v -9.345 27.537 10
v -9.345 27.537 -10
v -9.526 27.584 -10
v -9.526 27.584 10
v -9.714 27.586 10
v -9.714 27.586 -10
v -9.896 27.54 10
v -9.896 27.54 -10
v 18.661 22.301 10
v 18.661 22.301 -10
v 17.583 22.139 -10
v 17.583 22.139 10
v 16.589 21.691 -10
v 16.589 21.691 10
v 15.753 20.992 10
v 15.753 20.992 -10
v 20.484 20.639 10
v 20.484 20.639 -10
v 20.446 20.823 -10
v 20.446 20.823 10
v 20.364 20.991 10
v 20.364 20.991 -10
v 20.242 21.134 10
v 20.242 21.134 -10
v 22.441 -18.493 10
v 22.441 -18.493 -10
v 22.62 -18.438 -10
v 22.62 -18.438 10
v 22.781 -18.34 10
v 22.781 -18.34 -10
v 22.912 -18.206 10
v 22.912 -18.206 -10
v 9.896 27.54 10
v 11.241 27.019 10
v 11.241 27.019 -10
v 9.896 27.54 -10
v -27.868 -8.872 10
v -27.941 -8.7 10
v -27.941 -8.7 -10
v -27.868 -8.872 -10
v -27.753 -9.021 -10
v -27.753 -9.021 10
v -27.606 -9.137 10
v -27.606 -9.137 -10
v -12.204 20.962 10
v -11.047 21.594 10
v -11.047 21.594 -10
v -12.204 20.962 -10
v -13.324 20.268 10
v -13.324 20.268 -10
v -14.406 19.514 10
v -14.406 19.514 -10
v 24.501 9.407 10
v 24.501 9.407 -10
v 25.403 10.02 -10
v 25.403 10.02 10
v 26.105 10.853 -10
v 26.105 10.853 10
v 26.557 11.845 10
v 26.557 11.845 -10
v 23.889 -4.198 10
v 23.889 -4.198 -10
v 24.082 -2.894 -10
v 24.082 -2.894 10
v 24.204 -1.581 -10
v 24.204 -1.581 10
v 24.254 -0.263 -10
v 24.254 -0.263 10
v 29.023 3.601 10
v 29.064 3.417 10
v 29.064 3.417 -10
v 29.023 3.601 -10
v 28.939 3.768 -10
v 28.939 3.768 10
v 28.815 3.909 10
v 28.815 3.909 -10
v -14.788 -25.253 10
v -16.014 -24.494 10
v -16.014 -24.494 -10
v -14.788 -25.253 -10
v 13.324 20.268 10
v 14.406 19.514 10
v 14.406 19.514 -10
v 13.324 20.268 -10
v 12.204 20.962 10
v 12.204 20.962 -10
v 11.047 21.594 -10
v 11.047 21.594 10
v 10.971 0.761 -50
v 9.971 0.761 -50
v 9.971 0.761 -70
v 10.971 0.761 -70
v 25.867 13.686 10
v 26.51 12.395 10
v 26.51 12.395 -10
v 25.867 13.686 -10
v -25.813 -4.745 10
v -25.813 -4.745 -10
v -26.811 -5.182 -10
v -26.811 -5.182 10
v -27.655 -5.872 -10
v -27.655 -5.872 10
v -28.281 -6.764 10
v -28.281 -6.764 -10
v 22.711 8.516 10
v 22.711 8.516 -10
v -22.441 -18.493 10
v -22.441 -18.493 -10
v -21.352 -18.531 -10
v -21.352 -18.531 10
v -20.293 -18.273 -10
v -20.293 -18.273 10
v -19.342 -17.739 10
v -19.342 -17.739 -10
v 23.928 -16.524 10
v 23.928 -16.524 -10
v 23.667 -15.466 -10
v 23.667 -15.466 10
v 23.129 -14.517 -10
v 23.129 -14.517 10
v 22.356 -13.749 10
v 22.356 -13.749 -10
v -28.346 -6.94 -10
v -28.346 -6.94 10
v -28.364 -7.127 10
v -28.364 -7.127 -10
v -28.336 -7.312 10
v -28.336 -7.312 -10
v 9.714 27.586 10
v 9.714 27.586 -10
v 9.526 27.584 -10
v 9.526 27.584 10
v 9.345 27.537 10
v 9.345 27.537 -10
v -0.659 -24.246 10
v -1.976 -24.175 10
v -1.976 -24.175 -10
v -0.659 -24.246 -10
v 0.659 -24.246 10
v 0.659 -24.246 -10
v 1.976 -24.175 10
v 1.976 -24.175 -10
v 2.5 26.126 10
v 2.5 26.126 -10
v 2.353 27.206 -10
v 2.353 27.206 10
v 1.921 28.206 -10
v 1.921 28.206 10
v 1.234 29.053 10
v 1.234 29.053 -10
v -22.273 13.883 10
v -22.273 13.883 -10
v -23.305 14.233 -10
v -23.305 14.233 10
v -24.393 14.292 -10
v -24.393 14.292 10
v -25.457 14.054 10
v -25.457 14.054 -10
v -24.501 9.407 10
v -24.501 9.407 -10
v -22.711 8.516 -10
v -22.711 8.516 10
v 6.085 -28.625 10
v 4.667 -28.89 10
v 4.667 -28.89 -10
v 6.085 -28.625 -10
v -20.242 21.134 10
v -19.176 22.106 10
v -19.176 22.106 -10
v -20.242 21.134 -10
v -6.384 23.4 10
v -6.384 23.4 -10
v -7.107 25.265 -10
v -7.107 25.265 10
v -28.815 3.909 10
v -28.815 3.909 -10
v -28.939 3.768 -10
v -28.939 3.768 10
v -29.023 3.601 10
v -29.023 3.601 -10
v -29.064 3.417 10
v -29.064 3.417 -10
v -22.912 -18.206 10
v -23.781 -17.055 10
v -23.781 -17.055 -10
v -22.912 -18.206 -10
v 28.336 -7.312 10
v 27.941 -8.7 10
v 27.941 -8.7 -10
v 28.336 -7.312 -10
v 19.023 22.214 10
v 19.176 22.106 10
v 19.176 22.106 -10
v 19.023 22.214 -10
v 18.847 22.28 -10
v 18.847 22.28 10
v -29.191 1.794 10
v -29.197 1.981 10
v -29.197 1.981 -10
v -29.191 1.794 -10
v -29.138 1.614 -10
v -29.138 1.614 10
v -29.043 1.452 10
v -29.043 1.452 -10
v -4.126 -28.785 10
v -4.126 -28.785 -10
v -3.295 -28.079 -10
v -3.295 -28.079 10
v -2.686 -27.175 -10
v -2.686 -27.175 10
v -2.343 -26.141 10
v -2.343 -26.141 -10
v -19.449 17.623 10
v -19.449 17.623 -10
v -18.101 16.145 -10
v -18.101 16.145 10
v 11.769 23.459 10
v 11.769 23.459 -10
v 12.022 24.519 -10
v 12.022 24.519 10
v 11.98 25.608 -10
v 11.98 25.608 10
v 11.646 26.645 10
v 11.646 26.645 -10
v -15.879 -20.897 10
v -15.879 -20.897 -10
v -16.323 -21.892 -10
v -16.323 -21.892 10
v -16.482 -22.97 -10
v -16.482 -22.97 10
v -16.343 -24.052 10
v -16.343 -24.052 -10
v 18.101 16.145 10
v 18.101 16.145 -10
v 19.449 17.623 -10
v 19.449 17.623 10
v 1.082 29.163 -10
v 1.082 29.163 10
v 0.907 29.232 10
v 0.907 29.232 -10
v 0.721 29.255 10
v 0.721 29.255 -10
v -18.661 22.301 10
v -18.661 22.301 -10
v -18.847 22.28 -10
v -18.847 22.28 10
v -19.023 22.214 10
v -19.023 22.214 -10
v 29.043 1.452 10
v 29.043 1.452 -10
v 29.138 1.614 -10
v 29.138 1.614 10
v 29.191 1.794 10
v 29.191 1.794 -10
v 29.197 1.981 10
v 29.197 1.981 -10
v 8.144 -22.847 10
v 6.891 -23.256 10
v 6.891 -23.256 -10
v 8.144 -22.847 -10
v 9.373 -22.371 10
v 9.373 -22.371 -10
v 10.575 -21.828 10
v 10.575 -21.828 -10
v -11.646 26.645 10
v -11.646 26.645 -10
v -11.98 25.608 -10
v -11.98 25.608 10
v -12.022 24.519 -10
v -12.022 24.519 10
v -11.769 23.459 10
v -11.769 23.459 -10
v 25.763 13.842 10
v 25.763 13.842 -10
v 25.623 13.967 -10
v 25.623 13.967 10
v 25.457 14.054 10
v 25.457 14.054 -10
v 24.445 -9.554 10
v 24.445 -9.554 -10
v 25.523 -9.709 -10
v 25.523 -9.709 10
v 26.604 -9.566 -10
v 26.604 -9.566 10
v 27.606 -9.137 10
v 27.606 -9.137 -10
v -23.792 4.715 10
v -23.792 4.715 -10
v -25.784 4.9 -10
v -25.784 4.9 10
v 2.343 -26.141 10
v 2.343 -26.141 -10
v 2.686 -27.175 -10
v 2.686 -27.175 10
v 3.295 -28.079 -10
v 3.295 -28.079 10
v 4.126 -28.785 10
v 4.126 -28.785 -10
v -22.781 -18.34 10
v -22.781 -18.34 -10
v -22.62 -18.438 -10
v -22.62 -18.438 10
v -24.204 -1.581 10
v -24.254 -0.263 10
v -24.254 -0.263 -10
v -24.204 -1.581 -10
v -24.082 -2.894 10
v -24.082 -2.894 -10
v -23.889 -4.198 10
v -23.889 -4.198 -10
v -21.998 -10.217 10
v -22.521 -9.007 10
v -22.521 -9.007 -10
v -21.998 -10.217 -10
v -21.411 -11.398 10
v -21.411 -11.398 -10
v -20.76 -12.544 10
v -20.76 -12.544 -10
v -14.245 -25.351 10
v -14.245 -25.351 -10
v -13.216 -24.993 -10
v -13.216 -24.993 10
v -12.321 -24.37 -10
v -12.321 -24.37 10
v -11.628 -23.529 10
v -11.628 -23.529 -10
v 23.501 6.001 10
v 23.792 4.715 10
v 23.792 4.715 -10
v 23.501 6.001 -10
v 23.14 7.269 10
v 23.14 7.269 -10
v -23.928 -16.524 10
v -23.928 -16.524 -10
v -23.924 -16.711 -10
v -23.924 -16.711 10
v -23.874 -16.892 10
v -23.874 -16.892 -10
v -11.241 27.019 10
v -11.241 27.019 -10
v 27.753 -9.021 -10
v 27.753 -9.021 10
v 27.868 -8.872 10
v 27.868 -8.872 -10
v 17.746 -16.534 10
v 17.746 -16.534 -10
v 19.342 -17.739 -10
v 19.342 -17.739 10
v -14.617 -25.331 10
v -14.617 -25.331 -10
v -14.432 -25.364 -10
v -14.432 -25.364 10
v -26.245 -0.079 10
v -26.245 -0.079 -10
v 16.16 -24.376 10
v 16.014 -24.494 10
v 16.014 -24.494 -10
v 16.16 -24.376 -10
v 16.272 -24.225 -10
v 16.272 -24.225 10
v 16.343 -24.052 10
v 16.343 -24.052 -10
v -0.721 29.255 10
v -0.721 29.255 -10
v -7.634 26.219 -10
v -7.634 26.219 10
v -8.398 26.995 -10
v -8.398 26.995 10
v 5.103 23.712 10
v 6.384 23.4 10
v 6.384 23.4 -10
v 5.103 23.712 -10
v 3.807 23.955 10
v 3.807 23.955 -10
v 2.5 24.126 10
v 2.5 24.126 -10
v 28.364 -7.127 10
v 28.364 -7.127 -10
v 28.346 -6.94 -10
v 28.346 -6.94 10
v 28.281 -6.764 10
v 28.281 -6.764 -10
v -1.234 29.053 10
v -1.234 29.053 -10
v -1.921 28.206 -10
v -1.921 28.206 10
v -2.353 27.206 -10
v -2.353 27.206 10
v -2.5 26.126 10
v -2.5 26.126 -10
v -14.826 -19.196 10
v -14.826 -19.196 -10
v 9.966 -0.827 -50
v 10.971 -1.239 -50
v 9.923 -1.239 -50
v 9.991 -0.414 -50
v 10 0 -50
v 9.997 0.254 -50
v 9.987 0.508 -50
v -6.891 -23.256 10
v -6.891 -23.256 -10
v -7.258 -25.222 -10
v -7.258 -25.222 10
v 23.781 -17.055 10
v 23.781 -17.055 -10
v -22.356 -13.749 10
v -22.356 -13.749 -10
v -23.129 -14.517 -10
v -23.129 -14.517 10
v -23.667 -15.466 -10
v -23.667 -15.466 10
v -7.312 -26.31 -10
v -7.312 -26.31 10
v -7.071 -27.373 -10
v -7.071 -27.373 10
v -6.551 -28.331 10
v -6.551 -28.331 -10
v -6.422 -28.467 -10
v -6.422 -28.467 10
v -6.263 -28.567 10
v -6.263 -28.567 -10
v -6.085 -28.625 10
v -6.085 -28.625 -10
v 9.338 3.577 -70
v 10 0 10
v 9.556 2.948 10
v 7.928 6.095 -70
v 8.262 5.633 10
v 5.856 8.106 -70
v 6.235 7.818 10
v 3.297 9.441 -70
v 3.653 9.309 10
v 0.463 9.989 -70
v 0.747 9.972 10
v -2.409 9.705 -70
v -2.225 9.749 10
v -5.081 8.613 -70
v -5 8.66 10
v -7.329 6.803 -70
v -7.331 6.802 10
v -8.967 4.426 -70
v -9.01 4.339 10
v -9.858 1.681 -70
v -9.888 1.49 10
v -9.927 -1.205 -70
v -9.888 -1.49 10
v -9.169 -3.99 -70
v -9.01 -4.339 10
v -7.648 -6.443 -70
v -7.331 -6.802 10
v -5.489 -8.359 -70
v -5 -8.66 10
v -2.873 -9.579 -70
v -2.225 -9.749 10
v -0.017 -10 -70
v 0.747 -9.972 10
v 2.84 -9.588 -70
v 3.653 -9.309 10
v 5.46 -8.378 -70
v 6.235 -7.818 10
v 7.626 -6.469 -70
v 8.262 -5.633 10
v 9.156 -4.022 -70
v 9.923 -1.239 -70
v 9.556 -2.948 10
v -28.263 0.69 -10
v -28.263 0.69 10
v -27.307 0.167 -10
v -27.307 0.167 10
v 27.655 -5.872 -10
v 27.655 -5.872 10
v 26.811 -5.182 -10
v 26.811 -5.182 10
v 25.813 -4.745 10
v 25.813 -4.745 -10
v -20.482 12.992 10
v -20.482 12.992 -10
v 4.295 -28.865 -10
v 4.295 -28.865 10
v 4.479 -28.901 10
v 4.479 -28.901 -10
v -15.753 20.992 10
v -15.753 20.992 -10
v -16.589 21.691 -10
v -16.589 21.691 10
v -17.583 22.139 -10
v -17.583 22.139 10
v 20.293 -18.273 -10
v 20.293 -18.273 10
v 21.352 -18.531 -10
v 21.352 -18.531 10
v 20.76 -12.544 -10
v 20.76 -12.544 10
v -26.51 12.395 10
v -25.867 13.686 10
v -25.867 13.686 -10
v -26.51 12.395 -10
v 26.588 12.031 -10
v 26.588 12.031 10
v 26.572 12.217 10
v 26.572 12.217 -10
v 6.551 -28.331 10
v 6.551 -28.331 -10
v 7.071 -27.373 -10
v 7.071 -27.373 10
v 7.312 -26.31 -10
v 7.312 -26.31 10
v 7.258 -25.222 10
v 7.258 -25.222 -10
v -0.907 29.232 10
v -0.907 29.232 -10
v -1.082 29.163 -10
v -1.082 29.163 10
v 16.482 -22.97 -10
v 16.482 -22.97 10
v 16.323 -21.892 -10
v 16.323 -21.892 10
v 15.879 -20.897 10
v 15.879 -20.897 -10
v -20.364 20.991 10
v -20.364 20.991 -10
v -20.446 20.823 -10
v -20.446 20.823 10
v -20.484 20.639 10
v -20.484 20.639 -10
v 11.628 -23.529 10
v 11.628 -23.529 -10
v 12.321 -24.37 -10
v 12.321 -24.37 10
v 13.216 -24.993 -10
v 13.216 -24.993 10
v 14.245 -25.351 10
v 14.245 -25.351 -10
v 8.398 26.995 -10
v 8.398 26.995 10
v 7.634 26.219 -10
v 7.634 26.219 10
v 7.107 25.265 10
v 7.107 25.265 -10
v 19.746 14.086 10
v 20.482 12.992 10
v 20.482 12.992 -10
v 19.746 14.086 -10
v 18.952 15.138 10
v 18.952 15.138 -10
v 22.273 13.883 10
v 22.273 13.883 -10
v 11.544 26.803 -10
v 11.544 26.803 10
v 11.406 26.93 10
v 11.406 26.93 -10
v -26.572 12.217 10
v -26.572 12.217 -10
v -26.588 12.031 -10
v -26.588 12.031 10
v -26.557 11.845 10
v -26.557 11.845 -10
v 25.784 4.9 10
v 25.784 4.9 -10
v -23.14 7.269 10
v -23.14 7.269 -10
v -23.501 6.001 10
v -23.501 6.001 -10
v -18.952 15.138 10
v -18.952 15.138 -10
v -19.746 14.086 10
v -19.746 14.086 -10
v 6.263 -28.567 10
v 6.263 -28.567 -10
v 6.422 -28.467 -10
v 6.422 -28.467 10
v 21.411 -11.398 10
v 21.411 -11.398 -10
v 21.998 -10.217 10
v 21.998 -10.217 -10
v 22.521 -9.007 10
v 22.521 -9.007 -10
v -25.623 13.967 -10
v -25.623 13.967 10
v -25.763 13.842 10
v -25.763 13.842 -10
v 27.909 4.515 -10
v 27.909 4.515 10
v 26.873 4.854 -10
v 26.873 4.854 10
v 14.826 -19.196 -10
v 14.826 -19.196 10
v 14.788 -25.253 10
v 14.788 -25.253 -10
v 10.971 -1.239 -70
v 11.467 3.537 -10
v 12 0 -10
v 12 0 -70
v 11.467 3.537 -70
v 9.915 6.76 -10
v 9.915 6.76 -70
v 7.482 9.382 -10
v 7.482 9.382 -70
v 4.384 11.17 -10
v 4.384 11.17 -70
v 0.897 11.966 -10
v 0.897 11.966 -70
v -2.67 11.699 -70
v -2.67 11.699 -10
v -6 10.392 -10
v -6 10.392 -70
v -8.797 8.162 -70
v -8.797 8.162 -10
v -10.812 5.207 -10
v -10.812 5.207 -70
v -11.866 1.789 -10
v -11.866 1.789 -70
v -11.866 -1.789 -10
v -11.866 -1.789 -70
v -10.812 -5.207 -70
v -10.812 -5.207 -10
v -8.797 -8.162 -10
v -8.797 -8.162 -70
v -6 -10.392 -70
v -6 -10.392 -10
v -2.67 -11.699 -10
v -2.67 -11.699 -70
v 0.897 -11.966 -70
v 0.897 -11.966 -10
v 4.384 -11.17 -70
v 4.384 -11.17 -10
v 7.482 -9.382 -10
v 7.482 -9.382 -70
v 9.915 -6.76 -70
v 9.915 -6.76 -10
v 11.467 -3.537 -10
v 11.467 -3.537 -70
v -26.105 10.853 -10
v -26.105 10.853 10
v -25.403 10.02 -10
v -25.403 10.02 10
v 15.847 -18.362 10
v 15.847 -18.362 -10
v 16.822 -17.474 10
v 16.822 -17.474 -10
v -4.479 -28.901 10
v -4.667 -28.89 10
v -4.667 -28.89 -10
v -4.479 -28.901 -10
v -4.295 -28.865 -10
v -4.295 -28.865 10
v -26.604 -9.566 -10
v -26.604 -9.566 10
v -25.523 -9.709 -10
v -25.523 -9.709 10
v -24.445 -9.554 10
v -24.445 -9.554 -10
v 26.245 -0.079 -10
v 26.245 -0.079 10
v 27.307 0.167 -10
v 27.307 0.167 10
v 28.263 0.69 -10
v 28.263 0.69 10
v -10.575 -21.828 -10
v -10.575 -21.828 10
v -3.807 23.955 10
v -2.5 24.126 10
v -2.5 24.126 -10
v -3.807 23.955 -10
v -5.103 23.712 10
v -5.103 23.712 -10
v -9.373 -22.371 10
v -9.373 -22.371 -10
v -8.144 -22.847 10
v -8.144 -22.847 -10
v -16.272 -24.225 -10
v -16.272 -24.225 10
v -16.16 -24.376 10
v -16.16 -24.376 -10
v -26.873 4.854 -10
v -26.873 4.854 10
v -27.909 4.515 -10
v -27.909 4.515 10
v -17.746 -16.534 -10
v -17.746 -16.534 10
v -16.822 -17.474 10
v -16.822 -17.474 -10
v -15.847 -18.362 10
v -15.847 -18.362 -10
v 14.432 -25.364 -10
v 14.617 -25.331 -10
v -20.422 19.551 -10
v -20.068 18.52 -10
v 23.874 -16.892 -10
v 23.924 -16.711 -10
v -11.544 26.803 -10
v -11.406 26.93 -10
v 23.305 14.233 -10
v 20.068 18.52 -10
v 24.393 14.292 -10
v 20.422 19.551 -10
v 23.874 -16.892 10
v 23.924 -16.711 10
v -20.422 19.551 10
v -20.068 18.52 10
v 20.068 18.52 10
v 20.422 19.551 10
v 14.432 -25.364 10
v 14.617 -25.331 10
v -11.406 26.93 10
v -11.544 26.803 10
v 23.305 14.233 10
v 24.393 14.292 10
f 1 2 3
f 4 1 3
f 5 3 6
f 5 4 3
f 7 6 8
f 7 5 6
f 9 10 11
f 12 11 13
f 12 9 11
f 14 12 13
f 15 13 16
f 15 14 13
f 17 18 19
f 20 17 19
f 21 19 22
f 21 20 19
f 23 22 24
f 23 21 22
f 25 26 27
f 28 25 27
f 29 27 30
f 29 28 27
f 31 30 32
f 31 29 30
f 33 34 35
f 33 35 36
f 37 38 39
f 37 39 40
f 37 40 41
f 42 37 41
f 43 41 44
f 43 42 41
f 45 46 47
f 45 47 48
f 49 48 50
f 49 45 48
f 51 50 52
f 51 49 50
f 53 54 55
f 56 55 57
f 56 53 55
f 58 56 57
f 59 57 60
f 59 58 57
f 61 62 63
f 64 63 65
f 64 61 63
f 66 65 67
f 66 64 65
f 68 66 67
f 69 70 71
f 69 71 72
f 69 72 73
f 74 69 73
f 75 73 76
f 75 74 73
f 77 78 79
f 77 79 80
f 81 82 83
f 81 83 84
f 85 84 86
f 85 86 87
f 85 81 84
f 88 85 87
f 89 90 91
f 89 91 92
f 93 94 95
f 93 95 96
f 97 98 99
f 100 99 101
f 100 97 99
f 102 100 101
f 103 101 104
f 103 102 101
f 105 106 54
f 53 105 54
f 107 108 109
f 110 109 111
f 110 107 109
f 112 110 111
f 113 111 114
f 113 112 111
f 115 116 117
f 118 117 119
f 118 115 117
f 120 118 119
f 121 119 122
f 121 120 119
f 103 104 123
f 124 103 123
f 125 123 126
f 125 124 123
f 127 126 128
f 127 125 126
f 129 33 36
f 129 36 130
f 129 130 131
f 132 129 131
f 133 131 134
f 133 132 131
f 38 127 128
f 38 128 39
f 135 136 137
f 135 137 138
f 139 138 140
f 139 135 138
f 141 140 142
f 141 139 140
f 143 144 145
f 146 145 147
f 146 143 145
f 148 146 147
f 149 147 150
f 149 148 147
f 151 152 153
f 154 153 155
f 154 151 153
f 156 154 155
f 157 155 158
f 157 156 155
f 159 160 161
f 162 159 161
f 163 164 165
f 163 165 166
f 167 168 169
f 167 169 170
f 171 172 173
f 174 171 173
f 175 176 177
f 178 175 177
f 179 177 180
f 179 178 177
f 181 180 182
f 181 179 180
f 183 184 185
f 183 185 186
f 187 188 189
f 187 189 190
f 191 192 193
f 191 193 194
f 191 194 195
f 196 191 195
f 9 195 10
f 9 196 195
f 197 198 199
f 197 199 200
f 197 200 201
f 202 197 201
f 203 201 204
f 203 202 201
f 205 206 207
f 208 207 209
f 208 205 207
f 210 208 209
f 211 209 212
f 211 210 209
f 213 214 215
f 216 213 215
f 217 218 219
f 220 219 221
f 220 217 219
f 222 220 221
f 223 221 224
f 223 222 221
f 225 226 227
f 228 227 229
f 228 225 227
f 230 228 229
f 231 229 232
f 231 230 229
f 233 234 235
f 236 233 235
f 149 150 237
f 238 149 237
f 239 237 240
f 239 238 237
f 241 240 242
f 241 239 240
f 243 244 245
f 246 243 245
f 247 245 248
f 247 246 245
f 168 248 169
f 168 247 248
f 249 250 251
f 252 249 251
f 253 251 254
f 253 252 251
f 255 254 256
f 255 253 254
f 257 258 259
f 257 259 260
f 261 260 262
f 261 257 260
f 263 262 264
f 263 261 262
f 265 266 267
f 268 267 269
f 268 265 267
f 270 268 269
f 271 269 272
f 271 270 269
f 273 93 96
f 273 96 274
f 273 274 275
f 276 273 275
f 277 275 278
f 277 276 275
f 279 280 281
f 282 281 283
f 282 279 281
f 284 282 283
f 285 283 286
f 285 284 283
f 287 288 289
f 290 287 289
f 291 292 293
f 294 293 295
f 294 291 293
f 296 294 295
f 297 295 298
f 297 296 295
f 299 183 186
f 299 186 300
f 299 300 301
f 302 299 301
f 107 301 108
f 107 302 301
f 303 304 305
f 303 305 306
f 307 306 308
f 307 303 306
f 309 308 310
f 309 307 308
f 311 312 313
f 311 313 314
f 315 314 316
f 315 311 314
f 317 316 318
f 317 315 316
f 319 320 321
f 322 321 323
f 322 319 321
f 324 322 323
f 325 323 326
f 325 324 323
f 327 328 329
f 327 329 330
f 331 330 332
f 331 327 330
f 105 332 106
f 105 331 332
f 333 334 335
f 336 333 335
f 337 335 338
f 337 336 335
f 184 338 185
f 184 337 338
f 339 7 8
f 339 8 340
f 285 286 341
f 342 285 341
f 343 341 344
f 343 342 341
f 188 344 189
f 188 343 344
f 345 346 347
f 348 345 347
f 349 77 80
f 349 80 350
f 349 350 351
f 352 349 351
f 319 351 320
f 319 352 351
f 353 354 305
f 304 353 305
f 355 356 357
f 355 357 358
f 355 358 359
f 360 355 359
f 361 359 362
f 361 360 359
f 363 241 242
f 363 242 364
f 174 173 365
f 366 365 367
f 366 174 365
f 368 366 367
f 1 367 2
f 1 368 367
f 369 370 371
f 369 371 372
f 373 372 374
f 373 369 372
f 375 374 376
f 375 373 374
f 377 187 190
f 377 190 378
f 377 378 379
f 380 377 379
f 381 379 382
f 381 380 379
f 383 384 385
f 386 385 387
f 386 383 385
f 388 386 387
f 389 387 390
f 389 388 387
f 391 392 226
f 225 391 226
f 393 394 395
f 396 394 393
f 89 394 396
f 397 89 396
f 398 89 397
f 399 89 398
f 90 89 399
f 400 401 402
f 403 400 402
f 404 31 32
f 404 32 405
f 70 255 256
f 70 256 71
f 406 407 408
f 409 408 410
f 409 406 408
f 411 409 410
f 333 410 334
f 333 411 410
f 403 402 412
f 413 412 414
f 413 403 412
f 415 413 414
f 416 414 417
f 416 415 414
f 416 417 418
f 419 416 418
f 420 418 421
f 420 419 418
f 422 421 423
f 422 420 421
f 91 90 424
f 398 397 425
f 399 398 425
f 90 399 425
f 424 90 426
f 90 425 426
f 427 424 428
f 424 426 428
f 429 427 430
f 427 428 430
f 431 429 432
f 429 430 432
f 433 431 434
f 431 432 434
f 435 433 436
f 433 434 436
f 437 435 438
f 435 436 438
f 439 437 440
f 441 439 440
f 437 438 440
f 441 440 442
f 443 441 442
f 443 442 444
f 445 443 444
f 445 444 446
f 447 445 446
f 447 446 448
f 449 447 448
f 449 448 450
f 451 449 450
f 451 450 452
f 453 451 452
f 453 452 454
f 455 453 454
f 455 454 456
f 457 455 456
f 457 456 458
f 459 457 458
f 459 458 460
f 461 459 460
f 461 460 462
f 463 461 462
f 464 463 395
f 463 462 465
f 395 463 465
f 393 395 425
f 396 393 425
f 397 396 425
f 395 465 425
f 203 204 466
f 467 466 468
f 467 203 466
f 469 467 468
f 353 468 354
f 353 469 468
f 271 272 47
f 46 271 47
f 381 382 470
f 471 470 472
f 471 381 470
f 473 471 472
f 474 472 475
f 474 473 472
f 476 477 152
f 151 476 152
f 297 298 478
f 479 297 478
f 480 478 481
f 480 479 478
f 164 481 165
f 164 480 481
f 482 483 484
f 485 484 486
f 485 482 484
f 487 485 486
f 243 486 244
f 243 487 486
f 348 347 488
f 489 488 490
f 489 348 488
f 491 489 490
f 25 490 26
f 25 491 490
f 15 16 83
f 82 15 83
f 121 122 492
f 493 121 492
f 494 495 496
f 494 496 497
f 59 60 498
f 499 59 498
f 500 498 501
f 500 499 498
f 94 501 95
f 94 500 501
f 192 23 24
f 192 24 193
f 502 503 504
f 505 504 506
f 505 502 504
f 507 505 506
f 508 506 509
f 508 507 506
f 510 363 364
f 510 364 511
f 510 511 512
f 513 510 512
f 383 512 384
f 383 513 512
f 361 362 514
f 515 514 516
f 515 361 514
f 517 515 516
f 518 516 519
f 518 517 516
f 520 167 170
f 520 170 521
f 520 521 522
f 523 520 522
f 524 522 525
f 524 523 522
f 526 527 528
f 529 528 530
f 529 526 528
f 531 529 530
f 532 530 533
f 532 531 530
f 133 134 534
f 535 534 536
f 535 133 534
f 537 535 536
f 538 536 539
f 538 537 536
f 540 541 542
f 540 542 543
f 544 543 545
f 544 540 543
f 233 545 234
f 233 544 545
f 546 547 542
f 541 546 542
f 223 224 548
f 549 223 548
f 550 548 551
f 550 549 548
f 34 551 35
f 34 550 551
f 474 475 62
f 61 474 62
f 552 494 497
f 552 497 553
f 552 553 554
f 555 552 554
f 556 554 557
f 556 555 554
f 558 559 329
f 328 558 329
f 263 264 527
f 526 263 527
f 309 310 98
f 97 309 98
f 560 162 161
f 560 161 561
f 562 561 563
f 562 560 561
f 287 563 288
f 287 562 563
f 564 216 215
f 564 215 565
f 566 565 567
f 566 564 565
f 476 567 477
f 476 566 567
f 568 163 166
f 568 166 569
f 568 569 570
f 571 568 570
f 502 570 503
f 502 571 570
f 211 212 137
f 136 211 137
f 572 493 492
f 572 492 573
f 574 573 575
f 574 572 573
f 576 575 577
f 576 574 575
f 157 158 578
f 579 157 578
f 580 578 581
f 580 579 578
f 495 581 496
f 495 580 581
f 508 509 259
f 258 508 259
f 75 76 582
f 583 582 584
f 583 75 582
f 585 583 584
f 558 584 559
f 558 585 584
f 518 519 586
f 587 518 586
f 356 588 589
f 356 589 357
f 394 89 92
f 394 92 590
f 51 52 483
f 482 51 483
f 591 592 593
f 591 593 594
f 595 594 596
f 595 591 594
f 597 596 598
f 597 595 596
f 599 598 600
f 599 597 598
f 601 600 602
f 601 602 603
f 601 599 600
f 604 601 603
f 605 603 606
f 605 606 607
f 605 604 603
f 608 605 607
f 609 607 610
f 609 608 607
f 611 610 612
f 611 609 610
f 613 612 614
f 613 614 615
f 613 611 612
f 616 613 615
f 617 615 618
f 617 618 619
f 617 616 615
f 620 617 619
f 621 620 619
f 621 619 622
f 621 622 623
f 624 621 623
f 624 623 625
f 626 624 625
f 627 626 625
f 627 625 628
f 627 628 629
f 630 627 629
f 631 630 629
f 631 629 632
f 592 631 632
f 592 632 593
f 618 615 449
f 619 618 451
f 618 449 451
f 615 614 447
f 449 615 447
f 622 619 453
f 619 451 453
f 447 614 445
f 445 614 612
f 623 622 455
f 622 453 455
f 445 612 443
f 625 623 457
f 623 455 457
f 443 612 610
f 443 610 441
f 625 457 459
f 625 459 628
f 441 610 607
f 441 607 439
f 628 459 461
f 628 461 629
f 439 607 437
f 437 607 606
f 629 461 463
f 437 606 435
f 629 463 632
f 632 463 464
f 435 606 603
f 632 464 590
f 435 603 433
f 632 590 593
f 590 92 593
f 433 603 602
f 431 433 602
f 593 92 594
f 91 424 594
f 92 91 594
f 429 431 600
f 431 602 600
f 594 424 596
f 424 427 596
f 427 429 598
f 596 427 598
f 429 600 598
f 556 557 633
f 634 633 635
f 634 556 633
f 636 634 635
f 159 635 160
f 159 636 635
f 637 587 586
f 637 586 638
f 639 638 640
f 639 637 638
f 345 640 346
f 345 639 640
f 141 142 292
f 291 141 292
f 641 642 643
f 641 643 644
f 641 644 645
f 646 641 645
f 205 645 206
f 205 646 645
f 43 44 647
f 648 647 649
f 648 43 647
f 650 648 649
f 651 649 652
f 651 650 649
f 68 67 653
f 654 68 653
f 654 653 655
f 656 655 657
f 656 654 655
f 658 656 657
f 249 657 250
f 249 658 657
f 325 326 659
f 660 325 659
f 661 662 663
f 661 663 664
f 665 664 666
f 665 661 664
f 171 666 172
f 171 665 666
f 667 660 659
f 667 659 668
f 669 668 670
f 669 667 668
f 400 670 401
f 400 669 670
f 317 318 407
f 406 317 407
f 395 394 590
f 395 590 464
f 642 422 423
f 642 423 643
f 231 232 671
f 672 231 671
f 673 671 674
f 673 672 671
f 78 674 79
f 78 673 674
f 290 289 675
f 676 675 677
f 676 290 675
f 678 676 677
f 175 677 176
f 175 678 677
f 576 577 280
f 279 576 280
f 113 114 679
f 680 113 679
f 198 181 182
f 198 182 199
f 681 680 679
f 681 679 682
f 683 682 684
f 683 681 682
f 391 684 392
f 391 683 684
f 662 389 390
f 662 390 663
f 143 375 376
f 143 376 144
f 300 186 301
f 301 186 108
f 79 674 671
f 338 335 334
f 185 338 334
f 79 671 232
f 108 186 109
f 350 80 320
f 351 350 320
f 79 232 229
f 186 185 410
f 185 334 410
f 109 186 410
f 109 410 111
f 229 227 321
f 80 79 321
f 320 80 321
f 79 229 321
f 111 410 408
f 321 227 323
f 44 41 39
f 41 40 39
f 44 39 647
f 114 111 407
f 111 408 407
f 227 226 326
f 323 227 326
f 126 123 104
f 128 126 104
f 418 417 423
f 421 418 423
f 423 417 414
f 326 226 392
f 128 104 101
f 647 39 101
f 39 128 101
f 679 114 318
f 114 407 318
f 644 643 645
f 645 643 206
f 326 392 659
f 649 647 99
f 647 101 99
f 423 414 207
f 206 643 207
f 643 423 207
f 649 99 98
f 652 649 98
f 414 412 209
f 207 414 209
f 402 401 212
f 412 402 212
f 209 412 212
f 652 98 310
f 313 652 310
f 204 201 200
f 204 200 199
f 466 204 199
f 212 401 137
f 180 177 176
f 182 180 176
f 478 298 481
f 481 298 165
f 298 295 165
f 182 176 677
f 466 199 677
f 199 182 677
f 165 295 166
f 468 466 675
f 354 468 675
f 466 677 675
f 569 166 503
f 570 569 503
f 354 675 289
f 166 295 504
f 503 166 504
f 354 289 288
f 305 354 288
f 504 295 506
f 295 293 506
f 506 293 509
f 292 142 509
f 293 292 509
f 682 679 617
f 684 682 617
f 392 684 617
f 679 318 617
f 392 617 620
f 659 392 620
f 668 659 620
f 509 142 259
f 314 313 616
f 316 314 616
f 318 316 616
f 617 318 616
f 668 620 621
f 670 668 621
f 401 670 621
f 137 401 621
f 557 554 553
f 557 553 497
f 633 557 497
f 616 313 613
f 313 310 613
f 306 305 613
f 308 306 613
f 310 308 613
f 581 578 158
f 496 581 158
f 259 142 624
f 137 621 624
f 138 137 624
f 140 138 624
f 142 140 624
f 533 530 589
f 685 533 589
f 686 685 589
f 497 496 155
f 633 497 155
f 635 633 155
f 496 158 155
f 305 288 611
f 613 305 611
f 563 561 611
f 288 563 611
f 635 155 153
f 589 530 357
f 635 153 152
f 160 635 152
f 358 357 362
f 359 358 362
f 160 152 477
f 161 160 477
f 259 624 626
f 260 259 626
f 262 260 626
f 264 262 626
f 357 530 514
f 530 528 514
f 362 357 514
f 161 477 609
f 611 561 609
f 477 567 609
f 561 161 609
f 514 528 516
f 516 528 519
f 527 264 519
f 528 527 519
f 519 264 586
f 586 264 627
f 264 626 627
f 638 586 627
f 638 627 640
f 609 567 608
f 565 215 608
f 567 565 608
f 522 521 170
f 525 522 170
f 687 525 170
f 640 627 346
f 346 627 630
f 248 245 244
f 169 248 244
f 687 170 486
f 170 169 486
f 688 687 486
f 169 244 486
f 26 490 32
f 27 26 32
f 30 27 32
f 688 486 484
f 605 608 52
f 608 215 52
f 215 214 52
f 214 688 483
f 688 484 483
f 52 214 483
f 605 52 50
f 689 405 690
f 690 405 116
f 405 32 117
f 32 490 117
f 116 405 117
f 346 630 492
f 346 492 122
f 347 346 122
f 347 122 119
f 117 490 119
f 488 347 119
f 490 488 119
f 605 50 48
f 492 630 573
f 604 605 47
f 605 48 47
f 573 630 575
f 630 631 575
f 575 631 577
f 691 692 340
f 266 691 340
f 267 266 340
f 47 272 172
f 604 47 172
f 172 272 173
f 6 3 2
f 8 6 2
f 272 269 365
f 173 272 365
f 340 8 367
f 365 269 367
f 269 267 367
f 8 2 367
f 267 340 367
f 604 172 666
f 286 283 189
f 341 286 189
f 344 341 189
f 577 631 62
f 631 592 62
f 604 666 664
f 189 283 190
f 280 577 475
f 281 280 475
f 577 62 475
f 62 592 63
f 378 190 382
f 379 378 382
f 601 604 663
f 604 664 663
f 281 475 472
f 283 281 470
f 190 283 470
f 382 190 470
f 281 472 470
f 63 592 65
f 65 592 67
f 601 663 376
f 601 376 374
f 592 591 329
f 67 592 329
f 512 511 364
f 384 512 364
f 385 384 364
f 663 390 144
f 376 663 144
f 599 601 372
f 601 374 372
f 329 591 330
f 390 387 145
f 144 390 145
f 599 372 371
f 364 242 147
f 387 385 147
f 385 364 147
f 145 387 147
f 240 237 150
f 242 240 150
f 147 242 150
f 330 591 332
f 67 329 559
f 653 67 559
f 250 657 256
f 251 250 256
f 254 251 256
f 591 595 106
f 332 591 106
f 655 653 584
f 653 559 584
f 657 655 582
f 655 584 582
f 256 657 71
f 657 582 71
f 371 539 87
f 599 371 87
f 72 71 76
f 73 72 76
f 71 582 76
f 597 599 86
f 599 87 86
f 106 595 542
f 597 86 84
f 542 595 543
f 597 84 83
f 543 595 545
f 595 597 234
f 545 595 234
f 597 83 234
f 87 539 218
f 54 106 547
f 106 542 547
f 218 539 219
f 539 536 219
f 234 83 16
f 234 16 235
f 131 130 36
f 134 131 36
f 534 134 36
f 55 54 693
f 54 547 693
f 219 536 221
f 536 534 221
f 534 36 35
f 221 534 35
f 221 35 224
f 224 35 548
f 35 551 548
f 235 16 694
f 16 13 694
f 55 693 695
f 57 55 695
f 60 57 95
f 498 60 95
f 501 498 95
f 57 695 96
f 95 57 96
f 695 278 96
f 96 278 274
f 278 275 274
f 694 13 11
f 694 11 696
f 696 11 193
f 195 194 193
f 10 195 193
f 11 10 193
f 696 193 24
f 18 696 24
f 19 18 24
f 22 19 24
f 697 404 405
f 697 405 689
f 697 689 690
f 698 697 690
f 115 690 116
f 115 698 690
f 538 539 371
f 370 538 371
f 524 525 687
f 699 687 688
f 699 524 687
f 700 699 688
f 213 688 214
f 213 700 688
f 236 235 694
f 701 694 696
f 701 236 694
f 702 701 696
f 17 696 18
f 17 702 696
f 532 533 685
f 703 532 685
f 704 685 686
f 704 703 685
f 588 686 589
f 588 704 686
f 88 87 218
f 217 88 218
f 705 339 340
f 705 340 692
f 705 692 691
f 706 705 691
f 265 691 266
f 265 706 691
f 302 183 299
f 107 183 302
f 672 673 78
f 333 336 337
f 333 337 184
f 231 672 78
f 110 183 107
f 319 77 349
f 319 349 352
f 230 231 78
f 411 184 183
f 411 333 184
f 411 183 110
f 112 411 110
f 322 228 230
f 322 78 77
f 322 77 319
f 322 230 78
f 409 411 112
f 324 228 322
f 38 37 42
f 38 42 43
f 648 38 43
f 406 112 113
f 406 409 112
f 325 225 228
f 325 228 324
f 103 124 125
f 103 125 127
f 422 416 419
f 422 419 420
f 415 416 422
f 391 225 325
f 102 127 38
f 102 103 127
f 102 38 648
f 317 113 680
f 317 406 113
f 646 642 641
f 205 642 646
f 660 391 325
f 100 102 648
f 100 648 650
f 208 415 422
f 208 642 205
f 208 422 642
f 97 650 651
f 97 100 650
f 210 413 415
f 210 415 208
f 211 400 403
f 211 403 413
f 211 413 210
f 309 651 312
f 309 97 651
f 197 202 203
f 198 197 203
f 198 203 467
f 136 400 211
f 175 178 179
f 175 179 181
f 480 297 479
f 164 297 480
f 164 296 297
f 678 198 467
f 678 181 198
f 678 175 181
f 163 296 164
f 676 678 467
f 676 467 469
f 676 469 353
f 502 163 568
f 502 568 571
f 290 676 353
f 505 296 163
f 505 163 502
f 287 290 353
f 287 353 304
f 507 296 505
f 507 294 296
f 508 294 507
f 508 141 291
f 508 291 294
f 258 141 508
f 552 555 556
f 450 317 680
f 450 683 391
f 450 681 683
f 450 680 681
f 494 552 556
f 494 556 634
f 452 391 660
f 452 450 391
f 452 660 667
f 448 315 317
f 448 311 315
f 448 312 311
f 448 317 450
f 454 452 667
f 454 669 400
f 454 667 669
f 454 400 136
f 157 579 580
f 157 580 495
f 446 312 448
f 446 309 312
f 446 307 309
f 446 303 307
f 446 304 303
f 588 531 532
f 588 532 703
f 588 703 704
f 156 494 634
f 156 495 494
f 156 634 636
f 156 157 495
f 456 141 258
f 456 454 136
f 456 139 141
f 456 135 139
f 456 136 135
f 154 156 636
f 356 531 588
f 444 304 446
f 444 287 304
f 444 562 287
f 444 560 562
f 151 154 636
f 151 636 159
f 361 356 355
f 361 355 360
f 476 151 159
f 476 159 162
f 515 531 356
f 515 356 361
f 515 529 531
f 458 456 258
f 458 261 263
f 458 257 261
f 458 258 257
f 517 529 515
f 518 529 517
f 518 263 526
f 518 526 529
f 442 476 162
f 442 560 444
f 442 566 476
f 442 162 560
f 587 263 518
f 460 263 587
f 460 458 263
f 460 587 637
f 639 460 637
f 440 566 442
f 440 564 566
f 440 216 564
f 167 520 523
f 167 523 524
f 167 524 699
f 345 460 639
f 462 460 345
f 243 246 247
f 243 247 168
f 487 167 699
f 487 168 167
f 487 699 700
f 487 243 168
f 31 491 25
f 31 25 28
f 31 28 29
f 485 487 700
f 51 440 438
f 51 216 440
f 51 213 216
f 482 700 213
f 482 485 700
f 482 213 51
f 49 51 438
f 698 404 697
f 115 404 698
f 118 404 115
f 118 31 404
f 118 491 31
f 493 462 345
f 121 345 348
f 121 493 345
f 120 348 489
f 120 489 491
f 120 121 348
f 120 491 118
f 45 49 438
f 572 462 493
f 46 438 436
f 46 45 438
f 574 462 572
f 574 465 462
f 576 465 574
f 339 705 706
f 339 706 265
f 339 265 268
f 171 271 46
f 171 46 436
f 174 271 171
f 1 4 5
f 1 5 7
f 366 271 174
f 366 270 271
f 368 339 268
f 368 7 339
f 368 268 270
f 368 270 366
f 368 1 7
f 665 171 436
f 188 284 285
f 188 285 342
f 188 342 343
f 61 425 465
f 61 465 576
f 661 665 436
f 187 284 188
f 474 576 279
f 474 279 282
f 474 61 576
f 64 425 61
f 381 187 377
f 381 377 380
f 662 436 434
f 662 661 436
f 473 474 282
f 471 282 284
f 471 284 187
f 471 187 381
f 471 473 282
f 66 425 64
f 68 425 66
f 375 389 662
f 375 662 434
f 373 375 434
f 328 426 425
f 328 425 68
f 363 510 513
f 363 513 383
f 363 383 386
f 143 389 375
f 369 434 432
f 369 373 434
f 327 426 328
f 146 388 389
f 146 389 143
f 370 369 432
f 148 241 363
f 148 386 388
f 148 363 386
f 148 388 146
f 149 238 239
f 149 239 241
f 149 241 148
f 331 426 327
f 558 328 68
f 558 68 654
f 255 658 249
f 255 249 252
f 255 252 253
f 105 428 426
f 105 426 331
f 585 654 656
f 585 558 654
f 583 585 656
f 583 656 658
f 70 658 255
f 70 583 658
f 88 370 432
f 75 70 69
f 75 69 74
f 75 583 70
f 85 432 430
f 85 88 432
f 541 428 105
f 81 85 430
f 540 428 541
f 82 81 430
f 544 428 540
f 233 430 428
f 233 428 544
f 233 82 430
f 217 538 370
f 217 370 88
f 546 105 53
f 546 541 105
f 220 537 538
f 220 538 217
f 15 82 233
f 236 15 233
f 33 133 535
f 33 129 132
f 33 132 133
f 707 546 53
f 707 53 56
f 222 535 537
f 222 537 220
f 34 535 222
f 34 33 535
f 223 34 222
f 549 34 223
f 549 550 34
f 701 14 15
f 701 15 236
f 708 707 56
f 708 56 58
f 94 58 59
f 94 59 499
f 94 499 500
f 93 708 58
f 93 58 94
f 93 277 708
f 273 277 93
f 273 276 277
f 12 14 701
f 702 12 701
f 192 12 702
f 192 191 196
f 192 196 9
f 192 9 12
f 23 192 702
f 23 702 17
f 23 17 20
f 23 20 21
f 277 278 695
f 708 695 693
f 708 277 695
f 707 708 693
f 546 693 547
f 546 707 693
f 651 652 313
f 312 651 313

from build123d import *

# Parameters (mm, degrees)
SKETCH1_R           = 24.25521333
BOSS_EXTRUDE1_DEPTH = 10
BOSS_EXTRUDE2_DEPTH = 20
CIRPATTERN1_COUNT   = 17
SKETCH3_R           = 12
CUT_EXTRUDE1_DEPTH  = 20
SKETCH4_R           = 12
SKETCH4_R_2         = 10
BOSS_EXTRUDE3_DEPTH = 80
CUT_EXTRUDE2_START  = -20
CUT_EXTRUDE2_DEPTH  = 20


with BuildPart() as part:
    # Sketch1 → Boss-Extrude1 (new, symmetric)
    with BuildSketch(Plane.XY):
        Circle(SKETCH1_R)
    extrude(amount=BOSS_EXTRUDE1_DEPTH, both=True)

    # Sketch2 → Boss-Extrude2 (add, through all)
    with BuildSketch(Plane.XY.offset(10)):
        with BuildLine():
            Line((2.5, 24.126031039), (2.5, 26.126031039))
            ThreePointArc((2.5, 26.126031039), (2.171151383, 27.721007214), (1.233789603, 29.052714129))
            ThreePointArc((1.233789603, 29.052714129), (0.99677215, 29.202753866), (0.721205098, 29.25521333))
            Line((0.721205098, 29.25521333), (-0.721205098, 29.25521333))
            ThreePointArc((-0.721205098, 29.25521333), (-0.99677215, 29.202753866), (-1.233789603, 29.052714129))
            ThreePointArc((-1.233789603, 29.052714129), (-2.171151383, 27.721007214), (-2.5, 26.126031039))
            Line((-2.5, 26.126031039), (-2.5, 24.126031039))
            ThreePointArc((-2.5, 24.126031039), (0, 24.25521333), (2.5, 24.126031039))
        make_face()
    boss_extrude2 = extrude(amount=-BOSS_EXTRUDE2_DEPTH)

    # CirPattern1: Boss-Extrude2 ×17 about axis
    cirpattern1_axis = Axis((0, 0, 0), (0, 0, 1))
    for i in range(1, CIRPATTERN1_COUNT):
        add(boss_extrude2.rotate(cirpattern1_axis, i * 360 / CIRPATTERN1_COUNT))

    # Sketch3 → Cut-Extrude1 (cut)
    with BuildSketch(Plane.XY.offset(10)):
        Circle(SKETCH3_R)
    extrude(amount=-CUT_EXTRUDE1_DEPTH, mode=Mode.SUBTRACT)

    # Sketch4 → Boss-Extrude3 (add)
    with BuildSketch(Plane.XY.offset(10)):
        Circle(SKETCH4_R)
        Circle(SKETCH4_R_2, mode=Mode.SUBTRACT)
    extrude(amount=-BOSS_EXTRUDE3_DEPTH)

    # Sketch5 → Cut-Extrude2 (cut)
    with BuildSketch(Plane(origin=(0, 0, -70), x_dir=(-1, 0, 0), z_dir=(0, 0, -1)).offset(CUT_EXTRUDE2_START)):
        with BuildLine():
            Line((-10.971006085, 0.760945232), (-10.971006085, -1.239054768))
            Line((-10.971006085, -1.239054768), (-9.922940254, -1.239054768))
            ThreePointArc((-9.922940254, -1.239054768), (-9.997113345, -0.240259783), (-9.971006085, 0.760945232))
            Line((-9.971006085, 0.760945232), (-10.971006085, 0.760945232))
        make_face()
    extrude(amount=CUT_EXTRUDE2_DEPTH, mode=Mode.SUBTRACT)


solid = part.part
